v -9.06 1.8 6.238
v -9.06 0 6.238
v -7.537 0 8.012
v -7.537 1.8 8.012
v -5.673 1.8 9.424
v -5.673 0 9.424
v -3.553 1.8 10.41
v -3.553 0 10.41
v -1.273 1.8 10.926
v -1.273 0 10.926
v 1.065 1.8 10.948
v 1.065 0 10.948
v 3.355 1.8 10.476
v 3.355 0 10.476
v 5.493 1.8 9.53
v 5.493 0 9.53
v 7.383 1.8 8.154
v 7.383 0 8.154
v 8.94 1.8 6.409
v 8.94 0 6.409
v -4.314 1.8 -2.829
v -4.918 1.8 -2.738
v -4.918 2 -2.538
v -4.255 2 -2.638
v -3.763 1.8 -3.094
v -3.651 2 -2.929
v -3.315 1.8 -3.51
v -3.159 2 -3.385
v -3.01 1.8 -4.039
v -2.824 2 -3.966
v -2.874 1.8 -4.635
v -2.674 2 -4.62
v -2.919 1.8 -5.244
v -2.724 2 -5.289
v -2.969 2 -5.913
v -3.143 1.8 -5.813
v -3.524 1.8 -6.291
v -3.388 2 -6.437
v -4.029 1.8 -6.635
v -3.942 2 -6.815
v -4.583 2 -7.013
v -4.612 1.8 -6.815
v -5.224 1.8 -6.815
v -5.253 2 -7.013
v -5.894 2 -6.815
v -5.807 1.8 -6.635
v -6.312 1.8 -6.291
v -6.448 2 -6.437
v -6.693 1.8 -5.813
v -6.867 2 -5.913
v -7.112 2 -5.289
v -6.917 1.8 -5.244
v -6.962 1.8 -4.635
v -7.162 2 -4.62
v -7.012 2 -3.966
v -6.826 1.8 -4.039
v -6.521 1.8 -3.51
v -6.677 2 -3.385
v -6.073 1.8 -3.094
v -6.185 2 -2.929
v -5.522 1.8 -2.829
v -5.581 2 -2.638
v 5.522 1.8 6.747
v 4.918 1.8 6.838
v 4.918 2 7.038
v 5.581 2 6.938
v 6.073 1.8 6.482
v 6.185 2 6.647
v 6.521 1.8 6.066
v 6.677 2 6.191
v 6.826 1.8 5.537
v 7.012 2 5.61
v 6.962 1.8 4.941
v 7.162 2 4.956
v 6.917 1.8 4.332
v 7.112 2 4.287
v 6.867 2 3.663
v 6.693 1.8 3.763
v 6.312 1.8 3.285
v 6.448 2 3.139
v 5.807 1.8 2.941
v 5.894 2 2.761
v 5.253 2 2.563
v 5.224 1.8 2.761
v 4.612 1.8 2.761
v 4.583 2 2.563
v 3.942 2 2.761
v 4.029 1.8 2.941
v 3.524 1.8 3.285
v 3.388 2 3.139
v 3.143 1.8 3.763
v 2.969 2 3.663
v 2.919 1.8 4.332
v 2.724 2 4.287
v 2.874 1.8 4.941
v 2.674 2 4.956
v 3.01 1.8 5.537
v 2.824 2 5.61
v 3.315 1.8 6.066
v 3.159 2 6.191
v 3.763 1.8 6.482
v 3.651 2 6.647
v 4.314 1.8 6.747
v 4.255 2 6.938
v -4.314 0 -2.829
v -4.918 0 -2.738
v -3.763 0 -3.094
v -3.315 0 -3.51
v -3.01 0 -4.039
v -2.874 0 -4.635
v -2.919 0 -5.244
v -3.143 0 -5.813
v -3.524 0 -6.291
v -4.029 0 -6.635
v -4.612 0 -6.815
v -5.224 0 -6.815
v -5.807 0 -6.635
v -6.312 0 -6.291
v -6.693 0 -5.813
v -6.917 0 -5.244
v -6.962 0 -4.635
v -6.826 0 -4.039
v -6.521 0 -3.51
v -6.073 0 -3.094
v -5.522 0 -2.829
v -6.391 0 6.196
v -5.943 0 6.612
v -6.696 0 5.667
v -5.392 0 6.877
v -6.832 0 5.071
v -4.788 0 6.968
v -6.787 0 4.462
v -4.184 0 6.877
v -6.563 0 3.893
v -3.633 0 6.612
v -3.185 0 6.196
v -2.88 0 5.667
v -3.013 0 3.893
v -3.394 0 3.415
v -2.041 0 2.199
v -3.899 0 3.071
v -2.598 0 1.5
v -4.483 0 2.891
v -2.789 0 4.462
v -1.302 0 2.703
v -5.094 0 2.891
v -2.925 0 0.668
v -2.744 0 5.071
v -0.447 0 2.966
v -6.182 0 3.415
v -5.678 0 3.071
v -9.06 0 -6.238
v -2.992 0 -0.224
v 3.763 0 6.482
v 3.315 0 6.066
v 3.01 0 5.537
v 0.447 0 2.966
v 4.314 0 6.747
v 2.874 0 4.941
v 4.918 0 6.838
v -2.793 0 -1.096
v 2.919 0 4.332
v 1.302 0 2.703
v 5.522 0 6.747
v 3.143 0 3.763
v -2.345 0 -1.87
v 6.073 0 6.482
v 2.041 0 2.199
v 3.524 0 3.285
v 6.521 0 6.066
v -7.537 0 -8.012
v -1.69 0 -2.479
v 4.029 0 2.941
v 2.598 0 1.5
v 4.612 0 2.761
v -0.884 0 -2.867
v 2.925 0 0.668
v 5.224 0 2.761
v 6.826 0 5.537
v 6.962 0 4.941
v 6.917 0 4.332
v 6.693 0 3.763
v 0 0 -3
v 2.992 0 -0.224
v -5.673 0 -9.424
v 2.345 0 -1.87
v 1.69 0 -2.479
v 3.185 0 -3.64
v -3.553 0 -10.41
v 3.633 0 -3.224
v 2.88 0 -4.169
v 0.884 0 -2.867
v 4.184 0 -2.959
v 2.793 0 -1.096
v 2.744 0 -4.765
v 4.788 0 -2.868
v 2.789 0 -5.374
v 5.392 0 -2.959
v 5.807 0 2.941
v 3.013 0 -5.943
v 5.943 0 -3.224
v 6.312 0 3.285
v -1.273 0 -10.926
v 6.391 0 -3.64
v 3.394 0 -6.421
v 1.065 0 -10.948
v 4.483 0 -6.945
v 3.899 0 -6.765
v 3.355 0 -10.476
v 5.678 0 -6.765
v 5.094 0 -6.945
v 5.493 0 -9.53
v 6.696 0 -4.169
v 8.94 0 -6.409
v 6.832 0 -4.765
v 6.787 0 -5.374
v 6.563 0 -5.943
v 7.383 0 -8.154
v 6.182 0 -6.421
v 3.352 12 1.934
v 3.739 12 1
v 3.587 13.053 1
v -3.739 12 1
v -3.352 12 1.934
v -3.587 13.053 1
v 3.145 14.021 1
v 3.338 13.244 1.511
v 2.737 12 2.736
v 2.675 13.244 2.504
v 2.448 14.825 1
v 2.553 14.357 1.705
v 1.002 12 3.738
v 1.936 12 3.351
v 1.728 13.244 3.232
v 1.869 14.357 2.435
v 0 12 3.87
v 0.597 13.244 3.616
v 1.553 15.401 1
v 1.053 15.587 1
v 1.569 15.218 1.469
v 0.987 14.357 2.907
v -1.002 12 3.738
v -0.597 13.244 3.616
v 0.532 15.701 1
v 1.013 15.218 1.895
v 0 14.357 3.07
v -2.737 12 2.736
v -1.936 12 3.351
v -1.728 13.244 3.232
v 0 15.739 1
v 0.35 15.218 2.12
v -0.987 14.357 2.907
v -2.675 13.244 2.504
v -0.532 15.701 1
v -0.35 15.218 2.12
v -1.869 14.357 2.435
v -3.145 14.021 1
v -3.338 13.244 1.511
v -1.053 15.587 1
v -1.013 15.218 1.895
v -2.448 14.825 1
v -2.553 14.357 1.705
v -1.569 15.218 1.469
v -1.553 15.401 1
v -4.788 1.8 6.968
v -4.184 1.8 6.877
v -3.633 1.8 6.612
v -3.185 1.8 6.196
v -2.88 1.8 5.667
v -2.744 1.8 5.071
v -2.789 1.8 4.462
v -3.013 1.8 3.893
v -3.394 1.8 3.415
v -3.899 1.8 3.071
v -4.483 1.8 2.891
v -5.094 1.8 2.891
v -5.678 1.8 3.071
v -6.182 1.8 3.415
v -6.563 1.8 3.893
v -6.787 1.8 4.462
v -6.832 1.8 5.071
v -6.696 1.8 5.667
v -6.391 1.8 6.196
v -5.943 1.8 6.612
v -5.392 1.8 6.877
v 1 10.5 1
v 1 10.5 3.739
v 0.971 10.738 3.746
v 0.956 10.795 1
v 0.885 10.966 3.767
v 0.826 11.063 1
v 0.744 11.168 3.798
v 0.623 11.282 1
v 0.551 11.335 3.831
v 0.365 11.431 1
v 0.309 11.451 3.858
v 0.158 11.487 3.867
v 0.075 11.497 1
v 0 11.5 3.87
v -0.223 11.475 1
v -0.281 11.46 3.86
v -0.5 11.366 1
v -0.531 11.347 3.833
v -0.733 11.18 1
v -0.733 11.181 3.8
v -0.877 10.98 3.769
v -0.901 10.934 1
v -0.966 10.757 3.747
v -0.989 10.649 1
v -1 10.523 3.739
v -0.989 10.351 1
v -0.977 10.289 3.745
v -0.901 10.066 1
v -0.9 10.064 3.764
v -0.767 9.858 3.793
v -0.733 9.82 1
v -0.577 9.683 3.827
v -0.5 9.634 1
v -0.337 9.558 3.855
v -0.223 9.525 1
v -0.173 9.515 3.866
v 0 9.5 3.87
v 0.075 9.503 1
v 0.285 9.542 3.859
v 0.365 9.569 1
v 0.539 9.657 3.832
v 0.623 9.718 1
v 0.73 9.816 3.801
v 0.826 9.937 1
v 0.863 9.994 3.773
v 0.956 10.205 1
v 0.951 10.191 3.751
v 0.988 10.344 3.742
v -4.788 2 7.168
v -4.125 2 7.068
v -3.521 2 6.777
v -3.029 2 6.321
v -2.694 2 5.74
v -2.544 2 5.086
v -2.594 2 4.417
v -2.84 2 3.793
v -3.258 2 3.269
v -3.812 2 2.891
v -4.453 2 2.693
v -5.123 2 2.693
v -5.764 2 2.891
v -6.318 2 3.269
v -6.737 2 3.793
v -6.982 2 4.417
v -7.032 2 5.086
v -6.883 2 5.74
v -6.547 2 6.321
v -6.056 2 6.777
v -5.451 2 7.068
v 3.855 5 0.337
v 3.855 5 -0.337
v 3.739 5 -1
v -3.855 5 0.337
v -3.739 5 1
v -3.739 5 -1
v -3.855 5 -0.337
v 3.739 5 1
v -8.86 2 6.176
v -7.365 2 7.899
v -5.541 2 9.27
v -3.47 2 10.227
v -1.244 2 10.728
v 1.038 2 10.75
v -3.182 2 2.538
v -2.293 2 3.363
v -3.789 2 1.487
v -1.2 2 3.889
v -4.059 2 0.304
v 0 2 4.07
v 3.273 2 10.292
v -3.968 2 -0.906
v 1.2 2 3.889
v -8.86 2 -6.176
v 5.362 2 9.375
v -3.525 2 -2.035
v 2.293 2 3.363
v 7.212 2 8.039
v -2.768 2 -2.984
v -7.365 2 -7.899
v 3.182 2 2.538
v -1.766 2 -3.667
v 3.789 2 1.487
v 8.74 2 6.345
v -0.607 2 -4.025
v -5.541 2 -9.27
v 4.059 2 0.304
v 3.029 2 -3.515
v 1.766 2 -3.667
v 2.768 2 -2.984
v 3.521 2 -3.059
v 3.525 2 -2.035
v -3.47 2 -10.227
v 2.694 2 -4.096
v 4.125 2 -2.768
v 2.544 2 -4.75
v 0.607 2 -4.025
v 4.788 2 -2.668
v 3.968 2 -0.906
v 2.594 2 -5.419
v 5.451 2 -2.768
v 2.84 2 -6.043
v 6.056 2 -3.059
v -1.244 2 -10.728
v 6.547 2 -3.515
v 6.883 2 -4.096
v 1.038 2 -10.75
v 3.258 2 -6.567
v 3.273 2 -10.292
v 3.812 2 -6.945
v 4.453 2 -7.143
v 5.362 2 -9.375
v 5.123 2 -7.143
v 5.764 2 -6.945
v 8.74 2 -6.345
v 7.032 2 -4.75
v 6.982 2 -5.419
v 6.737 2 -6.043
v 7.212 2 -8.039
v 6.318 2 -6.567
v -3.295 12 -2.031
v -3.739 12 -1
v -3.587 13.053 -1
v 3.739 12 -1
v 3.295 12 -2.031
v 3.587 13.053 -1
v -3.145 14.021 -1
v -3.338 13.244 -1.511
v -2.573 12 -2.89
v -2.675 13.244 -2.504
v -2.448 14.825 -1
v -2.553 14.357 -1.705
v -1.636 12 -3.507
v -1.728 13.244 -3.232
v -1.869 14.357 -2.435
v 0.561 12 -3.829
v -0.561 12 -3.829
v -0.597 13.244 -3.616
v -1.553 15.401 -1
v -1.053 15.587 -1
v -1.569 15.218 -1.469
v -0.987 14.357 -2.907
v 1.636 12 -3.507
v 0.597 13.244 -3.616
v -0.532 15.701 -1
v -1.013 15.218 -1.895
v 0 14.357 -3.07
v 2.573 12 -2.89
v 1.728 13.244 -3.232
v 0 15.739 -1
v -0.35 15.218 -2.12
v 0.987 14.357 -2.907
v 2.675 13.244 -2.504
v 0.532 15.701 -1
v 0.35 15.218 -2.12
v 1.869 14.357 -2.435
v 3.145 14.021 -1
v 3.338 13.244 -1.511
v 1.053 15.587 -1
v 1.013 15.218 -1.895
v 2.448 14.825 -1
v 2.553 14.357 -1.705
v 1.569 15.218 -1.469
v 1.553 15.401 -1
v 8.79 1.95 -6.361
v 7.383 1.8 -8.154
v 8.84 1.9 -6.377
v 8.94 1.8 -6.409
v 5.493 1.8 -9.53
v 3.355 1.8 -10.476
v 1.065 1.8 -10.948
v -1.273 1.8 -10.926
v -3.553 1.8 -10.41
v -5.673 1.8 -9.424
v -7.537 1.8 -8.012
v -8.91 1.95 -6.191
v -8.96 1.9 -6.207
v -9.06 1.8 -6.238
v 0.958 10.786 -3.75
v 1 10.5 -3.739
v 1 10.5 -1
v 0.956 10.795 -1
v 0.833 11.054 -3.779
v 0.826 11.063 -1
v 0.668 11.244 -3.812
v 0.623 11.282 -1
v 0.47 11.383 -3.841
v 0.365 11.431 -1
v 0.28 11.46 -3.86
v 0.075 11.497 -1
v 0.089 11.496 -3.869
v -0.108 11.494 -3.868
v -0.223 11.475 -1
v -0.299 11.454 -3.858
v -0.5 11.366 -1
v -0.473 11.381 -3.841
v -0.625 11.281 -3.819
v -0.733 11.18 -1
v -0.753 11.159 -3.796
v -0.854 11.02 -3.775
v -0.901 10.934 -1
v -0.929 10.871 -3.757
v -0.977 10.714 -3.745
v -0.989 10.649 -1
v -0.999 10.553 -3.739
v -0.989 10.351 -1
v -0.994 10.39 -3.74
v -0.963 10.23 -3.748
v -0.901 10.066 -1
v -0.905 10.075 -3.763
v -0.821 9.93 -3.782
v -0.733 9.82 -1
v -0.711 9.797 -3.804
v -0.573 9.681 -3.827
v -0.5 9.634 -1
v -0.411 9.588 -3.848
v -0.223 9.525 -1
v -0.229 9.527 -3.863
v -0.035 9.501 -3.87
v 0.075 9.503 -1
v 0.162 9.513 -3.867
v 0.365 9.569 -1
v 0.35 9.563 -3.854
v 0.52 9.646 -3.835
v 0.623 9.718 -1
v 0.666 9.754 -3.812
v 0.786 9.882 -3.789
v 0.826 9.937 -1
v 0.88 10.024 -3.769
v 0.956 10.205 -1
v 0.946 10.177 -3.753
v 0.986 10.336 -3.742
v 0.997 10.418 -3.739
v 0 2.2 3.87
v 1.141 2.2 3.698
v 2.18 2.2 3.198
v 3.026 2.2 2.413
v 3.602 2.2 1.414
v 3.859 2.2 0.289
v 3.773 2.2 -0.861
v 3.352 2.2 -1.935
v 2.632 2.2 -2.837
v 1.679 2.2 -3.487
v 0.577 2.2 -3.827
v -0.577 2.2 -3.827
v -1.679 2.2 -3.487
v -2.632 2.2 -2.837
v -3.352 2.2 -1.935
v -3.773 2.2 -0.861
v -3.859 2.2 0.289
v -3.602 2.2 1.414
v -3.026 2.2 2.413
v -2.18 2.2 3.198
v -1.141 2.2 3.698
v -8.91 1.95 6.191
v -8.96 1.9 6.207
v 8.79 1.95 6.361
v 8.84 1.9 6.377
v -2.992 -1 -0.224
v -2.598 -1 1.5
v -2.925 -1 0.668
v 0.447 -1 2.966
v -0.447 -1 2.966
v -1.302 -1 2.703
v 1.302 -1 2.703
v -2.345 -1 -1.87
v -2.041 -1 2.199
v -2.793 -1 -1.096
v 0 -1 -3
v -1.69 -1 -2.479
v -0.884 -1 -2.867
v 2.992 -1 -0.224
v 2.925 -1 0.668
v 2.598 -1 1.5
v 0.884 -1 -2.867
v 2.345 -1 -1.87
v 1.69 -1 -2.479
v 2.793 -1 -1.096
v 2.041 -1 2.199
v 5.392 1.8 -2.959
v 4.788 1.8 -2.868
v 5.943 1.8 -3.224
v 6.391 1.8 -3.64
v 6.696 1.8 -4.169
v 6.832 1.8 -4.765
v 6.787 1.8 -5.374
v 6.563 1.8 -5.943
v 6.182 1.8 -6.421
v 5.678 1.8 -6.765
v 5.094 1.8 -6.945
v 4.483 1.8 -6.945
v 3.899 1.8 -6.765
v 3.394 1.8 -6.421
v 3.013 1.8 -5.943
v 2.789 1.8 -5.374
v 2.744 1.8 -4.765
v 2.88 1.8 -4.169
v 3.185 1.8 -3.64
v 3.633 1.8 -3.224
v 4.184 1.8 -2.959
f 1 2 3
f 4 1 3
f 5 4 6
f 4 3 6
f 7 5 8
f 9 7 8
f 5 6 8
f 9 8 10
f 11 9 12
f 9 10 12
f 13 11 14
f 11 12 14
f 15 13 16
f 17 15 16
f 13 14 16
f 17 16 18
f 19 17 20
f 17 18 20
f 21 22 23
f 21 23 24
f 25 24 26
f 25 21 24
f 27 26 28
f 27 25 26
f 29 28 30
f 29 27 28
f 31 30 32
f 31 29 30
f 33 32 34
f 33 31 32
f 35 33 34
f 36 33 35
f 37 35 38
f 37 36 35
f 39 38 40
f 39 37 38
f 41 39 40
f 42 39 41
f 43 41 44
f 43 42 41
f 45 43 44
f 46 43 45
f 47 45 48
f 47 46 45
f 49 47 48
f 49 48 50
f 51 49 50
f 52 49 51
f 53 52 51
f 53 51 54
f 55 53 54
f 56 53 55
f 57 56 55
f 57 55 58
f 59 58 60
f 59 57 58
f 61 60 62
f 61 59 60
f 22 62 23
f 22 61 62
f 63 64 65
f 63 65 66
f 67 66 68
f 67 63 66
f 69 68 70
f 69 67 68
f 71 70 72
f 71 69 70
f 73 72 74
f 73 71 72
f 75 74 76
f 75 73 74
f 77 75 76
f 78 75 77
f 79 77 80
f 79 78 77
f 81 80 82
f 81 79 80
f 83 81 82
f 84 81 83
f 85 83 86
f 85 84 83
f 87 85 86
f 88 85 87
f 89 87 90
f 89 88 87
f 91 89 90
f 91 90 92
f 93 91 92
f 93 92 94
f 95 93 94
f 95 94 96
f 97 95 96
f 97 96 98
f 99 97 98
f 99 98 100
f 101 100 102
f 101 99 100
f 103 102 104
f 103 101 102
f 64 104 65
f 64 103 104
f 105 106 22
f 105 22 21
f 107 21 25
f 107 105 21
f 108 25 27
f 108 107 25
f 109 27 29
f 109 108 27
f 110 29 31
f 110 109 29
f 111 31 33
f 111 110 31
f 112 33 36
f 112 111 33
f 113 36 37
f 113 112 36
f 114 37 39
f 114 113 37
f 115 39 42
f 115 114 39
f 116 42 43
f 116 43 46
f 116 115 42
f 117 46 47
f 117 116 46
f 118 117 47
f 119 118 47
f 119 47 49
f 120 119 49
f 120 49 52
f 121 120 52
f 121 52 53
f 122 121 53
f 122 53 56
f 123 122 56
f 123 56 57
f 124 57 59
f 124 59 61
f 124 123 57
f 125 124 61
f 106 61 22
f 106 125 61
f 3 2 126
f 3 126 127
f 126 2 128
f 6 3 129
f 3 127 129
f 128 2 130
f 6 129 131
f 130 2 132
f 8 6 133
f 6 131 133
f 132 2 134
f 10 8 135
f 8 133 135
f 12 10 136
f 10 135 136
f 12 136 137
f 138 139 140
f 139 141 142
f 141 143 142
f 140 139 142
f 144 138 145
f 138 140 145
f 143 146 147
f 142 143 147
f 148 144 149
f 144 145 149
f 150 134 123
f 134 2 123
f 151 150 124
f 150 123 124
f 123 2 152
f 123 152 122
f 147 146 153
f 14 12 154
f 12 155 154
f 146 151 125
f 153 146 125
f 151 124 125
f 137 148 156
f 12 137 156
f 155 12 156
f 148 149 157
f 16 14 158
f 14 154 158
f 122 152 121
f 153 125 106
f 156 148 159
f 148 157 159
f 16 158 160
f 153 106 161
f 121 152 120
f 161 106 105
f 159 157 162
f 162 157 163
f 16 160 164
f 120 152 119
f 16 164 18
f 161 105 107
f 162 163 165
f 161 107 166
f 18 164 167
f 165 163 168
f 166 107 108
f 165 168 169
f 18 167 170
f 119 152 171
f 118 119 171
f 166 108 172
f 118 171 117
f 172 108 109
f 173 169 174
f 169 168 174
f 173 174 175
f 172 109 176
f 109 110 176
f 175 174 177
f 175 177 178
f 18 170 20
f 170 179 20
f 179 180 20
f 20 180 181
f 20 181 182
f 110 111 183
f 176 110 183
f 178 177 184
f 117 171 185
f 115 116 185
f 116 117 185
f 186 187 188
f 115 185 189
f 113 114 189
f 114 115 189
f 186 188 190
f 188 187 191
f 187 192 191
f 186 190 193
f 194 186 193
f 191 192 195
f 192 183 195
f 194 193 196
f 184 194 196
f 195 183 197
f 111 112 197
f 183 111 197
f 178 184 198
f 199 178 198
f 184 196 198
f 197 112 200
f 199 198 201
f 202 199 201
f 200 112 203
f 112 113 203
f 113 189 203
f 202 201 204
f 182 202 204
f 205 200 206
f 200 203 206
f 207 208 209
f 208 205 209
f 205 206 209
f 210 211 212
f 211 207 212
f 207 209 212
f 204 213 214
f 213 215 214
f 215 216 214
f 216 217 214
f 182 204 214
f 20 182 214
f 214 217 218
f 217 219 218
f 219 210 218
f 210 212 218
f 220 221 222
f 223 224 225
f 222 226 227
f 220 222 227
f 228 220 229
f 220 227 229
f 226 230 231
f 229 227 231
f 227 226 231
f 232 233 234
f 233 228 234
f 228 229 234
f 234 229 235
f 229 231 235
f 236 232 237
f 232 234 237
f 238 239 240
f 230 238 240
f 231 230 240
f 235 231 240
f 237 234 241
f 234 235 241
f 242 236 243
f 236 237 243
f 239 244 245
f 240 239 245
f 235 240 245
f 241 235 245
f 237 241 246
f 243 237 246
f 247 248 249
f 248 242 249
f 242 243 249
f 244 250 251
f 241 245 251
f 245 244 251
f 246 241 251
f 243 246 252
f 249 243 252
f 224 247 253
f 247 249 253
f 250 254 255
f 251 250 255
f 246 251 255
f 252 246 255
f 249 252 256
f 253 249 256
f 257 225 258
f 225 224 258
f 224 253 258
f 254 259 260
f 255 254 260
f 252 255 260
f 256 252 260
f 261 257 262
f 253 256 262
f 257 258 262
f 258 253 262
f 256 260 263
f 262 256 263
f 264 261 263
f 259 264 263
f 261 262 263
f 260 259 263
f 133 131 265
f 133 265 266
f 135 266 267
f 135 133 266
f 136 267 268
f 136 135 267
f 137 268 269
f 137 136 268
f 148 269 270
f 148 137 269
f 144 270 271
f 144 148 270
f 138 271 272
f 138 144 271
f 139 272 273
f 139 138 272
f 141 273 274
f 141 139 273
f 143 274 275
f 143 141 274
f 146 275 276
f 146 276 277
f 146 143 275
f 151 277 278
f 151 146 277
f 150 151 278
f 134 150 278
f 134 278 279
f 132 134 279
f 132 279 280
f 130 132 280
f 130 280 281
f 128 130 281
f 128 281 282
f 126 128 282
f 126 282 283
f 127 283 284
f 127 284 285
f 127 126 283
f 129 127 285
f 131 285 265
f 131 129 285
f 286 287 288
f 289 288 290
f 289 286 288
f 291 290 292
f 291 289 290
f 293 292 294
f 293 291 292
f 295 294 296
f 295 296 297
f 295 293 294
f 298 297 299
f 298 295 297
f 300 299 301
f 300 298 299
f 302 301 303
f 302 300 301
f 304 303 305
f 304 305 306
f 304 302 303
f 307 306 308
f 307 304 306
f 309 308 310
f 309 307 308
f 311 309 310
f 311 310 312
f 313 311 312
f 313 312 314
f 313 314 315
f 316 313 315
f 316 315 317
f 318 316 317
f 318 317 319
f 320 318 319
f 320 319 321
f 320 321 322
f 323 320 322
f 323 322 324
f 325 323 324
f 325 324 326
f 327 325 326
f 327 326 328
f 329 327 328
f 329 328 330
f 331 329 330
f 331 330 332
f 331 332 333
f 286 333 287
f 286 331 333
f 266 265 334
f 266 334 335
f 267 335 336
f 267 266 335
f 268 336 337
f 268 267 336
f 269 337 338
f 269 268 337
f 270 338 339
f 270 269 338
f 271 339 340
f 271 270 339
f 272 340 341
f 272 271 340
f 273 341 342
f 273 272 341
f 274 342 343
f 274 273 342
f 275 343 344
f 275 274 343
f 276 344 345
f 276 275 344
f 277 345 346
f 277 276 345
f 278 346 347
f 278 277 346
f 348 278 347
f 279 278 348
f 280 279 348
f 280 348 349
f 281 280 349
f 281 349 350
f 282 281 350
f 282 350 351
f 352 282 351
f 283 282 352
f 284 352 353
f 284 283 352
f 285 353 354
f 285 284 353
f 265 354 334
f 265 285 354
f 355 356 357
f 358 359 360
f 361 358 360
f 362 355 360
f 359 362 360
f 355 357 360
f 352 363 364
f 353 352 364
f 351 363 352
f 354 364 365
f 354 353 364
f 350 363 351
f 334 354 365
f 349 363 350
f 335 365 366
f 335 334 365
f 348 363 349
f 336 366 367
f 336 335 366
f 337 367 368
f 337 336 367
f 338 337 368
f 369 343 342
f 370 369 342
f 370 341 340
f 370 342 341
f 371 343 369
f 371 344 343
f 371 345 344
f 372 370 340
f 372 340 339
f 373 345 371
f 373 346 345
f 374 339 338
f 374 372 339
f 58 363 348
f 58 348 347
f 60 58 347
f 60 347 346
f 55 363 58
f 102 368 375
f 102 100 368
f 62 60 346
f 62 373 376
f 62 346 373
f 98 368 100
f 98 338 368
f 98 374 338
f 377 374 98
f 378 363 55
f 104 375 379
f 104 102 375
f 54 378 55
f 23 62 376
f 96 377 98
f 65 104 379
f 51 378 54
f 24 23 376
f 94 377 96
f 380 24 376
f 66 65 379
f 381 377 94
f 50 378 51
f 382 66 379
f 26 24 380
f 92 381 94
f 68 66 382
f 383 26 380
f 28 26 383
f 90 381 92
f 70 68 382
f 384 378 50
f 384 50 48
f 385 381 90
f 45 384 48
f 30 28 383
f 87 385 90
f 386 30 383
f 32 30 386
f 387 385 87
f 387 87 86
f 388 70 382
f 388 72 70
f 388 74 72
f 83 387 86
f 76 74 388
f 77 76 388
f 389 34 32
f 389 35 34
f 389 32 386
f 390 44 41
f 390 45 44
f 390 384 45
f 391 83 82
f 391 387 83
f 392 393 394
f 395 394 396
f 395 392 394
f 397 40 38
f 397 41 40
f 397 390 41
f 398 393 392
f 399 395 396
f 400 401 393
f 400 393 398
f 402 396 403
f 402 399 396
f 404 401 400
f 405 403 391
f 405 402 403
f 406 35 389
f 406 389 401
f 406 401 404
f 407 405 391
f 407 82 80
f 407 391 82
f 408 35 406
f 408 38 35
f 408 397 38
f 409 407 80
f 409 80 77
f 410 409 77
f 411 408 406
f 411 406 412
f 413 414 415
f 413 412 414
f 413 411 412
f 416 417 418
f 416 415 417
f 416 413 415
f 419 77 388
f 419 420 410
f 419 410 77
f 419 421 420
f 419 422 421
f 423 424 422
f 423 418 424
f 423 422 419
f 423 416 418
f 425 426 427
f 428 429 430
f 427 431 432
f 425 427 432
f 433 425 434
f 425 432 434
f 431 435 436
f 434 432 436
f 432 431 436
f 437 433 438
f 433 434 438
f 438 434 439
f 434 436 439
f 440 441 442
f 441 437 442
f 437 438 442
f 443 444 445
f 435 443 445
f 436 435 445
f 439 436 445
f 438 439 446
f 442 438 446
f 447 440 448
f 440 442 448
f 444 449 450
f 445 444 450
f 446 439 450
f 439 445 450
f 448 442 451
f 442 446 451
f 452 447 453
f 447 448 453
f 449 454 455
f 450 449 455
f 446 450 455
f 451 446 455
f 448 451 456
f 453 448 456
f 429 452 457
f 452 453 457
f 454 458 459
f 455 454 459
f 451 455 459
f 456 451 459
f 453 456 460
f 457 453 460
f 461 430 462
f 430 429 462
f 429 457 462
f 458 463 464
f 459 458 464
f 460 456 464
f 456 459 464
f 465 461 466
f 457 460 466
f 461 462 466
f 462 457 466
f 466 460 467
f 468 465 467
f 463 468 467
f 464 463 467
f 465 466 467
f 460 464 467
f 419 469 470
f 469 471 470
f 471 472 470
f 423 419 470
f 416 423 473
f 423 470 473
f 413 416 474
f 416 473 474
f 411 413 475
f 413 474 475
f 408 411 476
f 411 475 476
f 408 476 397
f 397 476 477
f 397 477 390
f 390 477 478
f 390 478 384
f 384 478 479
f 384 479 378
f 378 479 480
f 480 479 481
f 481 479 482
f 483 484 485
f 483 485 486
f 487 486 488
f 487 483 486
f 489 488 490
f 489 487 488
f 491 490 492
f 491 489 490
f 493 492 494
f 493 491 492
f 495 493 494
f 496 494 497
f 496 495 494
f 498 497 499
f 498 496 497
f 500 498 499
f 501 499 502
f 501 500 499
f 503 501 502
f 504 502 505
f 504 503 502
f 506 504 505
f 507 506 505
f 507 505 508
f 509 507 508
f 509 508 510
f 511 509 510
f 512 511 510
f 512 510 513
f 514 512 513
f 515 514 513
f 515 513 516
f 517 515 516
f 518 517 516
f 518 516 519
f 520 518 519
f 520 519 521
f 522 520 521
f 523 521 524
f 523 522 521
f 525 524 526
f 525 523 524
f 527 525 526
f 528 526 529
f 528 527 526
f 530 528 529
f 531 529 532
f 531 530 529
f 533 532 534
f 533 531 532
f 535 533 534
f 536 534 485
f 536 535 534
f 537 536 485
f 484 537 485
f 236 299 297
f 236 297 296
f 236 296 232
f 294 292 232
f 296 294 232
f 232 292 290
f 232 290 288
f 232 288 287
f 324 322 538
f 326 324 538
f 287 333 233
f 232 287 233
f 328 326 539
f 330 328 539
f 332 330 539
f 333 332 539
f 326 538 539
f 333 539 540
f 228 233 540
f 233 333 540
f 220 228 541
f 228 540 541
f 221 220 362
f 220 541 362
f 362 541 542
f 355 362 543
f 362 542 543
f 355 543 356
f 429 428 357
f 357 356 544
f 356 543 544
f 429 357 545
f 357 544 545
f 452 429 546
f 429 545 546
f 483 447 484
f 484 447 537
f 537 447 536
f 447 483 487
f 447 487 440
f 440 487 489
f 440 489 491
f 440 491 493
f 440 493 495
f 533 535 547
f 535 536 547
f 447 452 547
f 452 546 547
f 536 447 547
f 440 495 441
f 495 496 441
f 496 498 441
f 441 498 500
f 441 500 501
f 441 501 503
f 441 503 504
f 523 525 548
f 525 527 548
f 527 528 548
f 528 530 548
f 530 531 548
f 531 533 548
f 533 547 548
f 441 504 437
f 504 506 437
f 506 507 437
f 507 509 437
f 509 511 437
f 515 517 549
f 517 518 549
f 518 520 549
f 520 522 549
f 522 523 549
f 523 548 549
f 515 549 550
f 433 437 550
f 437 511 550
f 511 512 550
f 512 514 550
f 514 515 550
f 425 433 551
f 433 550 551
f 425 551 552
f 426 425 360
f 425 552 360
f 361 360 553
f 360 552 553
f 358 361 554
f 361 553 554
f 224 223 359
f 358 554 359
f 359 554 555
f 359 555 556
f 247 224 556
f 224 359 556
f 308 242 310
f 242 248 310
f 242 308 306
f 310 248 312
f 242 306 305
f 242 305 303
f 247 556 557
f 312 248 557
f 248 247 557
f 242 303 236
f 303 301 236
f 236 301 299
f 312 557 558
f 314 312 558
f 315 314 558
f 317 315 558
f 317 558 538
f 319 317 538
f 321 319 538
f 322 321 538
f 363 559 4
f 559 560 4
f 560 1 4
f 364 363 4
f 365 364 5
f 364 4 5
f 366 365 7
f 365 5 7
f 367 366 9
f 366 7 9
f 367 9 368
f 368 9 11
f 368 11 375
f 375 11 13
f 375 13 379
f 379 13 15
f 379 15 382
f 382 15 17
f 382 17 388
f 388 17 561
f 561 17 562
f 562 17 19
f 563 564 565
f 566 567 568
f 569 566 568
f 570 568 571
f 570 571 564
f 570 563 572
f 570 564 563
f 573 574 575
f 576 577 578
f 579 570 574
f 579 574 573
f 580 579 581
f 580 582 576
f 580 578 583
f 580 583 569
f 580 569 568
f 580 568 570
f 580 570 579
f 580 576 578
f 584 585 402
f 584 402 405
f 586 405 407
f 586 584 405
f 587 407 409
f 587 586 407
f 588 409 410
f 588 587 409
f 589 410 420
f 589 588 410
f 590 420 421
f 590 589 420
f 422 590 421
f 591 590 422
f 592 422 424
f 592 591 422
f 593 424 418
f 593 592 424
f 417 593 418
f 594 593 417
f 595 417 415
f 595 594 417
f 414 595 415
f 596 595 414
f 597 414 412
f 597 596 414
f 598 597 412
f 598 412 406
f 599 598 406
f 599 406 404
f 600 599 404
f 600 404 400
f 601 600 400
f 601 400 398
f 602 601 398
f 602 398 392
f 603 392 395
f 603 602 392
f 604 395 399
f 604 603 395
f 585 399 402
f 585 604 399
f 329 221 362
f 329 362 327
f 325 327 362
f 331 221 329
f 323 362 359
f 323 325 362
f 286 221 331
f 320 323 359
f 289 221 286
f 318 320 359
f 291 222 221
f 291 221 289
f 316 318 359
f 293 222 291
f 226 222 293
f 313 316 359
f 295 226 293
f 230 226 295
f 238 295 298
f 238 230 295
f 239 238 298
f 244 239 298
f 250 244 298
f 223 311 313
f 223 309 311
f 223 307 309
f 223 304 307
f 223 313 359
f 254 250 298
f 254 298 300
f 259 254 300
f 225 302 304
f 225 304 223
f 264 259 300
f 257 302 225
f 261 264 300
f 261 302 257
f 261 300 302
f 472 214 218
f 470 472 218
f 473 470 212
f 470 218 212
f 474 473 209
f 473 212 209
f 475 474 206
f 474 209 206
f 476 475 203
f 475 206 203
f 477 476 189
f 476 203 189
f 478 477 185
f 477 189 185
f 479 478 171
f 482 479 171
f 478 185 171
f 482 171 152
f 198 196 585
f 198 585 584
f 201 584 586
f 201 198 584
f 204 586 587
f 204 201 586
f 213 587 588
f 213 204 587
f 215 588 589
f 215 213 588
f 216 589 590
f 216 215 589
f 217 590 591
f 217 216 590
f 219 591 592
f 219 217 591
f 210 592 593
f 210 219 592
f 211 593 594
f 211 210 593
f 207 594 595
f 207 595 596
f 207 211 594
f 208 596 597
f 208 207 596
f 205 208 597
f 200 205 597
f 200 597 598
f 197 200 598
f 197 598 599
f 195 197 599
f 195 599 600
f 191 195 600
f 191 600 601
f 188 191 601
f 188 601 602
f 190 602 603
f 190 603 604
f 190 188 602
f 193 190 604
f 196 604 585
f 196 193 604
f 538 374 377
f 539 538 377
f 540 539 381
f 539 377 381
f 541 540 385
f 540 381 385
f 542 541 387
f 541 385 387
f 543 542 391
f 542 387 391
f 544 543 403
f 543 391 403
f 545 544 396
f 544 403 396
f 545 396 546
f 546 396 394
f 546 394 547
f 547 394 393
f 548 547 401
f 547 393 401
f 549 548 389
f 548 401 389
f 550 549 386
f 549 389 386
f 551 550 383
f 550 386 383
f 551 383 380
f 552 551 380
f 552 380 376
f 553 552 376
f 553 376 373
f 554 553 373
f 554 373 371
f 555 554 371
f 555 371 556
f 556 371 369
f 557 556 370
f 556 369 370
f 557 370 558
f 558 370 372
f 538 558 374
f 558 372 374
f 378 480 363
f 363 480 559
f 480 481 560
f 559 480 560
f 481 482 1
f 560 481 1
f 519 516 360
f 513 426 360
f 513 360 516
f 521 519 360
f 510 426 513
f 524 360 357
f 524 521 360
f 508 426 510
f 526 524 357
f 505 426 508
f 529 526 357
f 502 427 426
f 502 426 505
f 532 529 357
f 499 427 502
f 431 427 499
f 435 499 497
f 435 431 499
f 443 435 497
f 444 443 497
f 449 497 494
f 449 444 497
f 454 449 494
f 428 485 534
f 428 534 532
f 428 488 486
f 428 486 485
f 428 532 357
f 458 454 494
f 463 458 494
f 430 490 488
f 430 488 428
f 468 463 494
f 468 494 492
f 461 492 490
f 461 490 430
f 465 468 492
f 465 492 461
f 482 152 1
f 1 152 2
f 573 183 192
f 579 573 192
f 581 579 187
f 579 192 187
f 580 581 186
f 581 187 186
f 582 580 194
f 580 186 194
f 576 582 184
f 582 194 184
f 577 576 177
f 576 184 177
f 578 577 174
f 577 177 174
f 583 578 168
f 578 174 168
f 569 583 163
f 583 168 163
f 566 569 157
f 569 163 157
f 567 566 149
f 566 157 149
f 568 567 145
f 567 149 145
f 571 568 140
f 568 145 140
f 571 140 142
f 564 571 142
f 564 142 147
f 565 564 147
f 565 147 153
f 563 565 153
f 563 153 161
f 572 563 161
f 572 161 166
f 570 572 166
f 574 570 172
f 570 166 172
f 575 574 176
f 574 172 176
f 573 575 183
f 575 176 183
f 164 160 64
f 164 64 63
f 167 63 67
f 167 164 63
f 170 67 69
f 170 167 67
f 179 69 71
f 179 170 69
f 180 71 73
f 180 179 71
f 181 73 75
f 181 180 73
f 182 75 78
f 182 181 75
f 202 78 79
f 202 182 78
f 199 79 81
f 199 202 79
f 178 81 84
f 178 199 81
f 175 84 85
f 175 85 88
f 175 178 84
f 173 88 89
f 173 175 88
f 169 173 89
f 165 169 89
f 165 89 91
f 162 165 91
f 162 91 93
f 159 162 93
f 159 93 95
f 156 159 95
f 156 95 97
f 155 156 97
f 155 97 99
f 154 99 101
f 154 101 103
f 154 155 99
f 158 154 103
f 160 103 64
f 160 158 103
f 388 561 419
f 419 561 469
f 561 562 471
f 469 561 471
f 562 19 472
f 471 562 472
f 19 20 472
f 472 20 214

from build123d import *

# Parameters (mm, degrees)
SKETCH1_R               = 2.05
BOSS_EXTRUDE1_DEPTH     = 2
SKETCH2_R               = 3.87
BOSS_EXTRUDE2_DEPTH     = 10
SKETCH4_R               = 3
BOSS_EXTRUDE3_DEPTH     = 1
CUT_EXTRUDE2_DEPTH      = 15
CUT_EXTRUDE3_DEPTH      = 22.231780641
CUT_EXTRUDE3_DEPTH_BACK = 22.231780641
SKETCH9_R               = 1
CHAMFER1_SIZE           = 0.2


with BuildPart() as part:
    # Sketch1 → Boss-Extrude1 (new body)
    with BuildSketch(Plane(origin=(0, 0, 0), x_dir=(1, 0, 0), z_dir=(0, 1, 0))):
        with BuildLine():
            Line((-9.06012954, 6.238112913), (-9.06012954, -6.238112913))
            ThreePointArc((-9.06012954, -6.238112913), (-0.104590041, -10.999502758), (8.93987046, -6.40926799))
            Line((8.93987046, -6.40926799), (8.93987046, 6.40926799))
            ThreePointArc((8.93987046, 6.40926799), (-0.104590041, 10.999502758), (-9.06012954, 6.238112913))
        make_face()
        with Locations(Location((-4.917973081, 4.788086362, 0), (0, 0, 270))):
            Circle(SKETCH1_R, mode=Mode.SUBTRACT)
        with Locations(Location((4.788086362, 4.917973081, 0), (0, 0, 270))):
            Circle(SKETCH1_R, mode=Mode.SUBTRACT)
        with Locations(Location((4.917973081, -4.788086362, 0), (0, 0, 270))):
            Circle(SKETCH1_R, mode=Mode.SUBTRACT)
        with Locations(Location((-4.788086362, -4.917973081, 0), (0, 0, 270))):
            Circle(SKETCH1_R, mode=Mode.SUBTRACT)
    extrude(amount=BOSS_EXTRUDE1_DEPTH)

    # Sketch2 → Boss-Extrude2 (add)
    with BuildSketch(Plane(origin=(0, 2, 0), x_dir=(1, 0, 0), z_dir=(0, 1, 0))):
        with Locations(Location((0, 0, 0), (0, 0, 270))):
            Circle(SKETCH2_R)
    extrude(amount=BOSS_EXTRUDE2_DEPTH)

    # Sketch3 → Revolve1 (revolve)
    with BuildSketch(Plane.XY):
        with BuildLine():
            Line((0, 15.87), (0, 12))
            Line((0, 12), (3.87, 12))
            ThreePointArc((3.87, 12), (2.736503243, 14.736503243), (0, 15.87))
        make_face()
    revolve(axis=Axis((0, 15.87, 0), (0, -1, 0)))

    # Sketch4 → Boss-Extrude3 (add)
    with BuildSketch(Plane.XZ):
        with Locations(Location((0, 0, 0), (0, 0, 270))):
            Circle(SKETCH4_R)
    extrude(amount=BOSS_EXTRUDE3_DEPTH)

    # Sketch7 → Cut-Extrude2 (cut)
    with BuildSketch(Plane(origin=(0, 20, 0), x_dir=(1, 0, 0), z_dir=(0, 1, 0))):
        with BuildLine():
            Line((-7.332454233, 1), (7.579147316, 1))
            ThreePointArc((7.579147316, 1), (8.579147316, 0), (7.579147316, -1))
            Line((7.579147316, -1), (-7.332454233, -1))
            ThreePointArc((-7.332454233, -1), (-8.332454233, 0), (-7.332454233, 1))
        make_face()
    extrude(amount=-CUT_EXTRUDE2_DEPTH, mode=Mode.SUBTRACT)

    # Sketch9 → Cut-Extrude3 (cut, two sides: drawn at the far end of the back side and taken through both)
    with BuildSketch(Plane.XY.offset(-CUT_EXTRUDE3_DEPTH_BACK)):
        with Locations((0, 10.5)):
            Circle(SKETCH9_R)
    extrude(amount=CUT_EXTRUDE3_DEPTH + CUT_EXTRUDE3_DEPTH_BACK, mode=Mode.SUBTRACT)

    # Chamfer1
    chamfer1_edges = [part.edges().sort_by_distance(p)[0] for p in [
        (-4.917973081, 2, -6.838086362),
        (-0.104590041, 2, 10.999502758),
        (4.788086362, 2, -6.967973081),
        (8.93987046, 2, 0),
        (4.917973081, 2, 2.738086362),
        (-4.788086362, 2, 2.867973081),
        (0, 2, -3.87),
        (-0.104590041, 2, -10.999502758),
        (-9.06012954, 2, 0),
    ]]
    chamfer(chamfer1_edges, length=CHAMFER1_SIZE)


solid = part.part
